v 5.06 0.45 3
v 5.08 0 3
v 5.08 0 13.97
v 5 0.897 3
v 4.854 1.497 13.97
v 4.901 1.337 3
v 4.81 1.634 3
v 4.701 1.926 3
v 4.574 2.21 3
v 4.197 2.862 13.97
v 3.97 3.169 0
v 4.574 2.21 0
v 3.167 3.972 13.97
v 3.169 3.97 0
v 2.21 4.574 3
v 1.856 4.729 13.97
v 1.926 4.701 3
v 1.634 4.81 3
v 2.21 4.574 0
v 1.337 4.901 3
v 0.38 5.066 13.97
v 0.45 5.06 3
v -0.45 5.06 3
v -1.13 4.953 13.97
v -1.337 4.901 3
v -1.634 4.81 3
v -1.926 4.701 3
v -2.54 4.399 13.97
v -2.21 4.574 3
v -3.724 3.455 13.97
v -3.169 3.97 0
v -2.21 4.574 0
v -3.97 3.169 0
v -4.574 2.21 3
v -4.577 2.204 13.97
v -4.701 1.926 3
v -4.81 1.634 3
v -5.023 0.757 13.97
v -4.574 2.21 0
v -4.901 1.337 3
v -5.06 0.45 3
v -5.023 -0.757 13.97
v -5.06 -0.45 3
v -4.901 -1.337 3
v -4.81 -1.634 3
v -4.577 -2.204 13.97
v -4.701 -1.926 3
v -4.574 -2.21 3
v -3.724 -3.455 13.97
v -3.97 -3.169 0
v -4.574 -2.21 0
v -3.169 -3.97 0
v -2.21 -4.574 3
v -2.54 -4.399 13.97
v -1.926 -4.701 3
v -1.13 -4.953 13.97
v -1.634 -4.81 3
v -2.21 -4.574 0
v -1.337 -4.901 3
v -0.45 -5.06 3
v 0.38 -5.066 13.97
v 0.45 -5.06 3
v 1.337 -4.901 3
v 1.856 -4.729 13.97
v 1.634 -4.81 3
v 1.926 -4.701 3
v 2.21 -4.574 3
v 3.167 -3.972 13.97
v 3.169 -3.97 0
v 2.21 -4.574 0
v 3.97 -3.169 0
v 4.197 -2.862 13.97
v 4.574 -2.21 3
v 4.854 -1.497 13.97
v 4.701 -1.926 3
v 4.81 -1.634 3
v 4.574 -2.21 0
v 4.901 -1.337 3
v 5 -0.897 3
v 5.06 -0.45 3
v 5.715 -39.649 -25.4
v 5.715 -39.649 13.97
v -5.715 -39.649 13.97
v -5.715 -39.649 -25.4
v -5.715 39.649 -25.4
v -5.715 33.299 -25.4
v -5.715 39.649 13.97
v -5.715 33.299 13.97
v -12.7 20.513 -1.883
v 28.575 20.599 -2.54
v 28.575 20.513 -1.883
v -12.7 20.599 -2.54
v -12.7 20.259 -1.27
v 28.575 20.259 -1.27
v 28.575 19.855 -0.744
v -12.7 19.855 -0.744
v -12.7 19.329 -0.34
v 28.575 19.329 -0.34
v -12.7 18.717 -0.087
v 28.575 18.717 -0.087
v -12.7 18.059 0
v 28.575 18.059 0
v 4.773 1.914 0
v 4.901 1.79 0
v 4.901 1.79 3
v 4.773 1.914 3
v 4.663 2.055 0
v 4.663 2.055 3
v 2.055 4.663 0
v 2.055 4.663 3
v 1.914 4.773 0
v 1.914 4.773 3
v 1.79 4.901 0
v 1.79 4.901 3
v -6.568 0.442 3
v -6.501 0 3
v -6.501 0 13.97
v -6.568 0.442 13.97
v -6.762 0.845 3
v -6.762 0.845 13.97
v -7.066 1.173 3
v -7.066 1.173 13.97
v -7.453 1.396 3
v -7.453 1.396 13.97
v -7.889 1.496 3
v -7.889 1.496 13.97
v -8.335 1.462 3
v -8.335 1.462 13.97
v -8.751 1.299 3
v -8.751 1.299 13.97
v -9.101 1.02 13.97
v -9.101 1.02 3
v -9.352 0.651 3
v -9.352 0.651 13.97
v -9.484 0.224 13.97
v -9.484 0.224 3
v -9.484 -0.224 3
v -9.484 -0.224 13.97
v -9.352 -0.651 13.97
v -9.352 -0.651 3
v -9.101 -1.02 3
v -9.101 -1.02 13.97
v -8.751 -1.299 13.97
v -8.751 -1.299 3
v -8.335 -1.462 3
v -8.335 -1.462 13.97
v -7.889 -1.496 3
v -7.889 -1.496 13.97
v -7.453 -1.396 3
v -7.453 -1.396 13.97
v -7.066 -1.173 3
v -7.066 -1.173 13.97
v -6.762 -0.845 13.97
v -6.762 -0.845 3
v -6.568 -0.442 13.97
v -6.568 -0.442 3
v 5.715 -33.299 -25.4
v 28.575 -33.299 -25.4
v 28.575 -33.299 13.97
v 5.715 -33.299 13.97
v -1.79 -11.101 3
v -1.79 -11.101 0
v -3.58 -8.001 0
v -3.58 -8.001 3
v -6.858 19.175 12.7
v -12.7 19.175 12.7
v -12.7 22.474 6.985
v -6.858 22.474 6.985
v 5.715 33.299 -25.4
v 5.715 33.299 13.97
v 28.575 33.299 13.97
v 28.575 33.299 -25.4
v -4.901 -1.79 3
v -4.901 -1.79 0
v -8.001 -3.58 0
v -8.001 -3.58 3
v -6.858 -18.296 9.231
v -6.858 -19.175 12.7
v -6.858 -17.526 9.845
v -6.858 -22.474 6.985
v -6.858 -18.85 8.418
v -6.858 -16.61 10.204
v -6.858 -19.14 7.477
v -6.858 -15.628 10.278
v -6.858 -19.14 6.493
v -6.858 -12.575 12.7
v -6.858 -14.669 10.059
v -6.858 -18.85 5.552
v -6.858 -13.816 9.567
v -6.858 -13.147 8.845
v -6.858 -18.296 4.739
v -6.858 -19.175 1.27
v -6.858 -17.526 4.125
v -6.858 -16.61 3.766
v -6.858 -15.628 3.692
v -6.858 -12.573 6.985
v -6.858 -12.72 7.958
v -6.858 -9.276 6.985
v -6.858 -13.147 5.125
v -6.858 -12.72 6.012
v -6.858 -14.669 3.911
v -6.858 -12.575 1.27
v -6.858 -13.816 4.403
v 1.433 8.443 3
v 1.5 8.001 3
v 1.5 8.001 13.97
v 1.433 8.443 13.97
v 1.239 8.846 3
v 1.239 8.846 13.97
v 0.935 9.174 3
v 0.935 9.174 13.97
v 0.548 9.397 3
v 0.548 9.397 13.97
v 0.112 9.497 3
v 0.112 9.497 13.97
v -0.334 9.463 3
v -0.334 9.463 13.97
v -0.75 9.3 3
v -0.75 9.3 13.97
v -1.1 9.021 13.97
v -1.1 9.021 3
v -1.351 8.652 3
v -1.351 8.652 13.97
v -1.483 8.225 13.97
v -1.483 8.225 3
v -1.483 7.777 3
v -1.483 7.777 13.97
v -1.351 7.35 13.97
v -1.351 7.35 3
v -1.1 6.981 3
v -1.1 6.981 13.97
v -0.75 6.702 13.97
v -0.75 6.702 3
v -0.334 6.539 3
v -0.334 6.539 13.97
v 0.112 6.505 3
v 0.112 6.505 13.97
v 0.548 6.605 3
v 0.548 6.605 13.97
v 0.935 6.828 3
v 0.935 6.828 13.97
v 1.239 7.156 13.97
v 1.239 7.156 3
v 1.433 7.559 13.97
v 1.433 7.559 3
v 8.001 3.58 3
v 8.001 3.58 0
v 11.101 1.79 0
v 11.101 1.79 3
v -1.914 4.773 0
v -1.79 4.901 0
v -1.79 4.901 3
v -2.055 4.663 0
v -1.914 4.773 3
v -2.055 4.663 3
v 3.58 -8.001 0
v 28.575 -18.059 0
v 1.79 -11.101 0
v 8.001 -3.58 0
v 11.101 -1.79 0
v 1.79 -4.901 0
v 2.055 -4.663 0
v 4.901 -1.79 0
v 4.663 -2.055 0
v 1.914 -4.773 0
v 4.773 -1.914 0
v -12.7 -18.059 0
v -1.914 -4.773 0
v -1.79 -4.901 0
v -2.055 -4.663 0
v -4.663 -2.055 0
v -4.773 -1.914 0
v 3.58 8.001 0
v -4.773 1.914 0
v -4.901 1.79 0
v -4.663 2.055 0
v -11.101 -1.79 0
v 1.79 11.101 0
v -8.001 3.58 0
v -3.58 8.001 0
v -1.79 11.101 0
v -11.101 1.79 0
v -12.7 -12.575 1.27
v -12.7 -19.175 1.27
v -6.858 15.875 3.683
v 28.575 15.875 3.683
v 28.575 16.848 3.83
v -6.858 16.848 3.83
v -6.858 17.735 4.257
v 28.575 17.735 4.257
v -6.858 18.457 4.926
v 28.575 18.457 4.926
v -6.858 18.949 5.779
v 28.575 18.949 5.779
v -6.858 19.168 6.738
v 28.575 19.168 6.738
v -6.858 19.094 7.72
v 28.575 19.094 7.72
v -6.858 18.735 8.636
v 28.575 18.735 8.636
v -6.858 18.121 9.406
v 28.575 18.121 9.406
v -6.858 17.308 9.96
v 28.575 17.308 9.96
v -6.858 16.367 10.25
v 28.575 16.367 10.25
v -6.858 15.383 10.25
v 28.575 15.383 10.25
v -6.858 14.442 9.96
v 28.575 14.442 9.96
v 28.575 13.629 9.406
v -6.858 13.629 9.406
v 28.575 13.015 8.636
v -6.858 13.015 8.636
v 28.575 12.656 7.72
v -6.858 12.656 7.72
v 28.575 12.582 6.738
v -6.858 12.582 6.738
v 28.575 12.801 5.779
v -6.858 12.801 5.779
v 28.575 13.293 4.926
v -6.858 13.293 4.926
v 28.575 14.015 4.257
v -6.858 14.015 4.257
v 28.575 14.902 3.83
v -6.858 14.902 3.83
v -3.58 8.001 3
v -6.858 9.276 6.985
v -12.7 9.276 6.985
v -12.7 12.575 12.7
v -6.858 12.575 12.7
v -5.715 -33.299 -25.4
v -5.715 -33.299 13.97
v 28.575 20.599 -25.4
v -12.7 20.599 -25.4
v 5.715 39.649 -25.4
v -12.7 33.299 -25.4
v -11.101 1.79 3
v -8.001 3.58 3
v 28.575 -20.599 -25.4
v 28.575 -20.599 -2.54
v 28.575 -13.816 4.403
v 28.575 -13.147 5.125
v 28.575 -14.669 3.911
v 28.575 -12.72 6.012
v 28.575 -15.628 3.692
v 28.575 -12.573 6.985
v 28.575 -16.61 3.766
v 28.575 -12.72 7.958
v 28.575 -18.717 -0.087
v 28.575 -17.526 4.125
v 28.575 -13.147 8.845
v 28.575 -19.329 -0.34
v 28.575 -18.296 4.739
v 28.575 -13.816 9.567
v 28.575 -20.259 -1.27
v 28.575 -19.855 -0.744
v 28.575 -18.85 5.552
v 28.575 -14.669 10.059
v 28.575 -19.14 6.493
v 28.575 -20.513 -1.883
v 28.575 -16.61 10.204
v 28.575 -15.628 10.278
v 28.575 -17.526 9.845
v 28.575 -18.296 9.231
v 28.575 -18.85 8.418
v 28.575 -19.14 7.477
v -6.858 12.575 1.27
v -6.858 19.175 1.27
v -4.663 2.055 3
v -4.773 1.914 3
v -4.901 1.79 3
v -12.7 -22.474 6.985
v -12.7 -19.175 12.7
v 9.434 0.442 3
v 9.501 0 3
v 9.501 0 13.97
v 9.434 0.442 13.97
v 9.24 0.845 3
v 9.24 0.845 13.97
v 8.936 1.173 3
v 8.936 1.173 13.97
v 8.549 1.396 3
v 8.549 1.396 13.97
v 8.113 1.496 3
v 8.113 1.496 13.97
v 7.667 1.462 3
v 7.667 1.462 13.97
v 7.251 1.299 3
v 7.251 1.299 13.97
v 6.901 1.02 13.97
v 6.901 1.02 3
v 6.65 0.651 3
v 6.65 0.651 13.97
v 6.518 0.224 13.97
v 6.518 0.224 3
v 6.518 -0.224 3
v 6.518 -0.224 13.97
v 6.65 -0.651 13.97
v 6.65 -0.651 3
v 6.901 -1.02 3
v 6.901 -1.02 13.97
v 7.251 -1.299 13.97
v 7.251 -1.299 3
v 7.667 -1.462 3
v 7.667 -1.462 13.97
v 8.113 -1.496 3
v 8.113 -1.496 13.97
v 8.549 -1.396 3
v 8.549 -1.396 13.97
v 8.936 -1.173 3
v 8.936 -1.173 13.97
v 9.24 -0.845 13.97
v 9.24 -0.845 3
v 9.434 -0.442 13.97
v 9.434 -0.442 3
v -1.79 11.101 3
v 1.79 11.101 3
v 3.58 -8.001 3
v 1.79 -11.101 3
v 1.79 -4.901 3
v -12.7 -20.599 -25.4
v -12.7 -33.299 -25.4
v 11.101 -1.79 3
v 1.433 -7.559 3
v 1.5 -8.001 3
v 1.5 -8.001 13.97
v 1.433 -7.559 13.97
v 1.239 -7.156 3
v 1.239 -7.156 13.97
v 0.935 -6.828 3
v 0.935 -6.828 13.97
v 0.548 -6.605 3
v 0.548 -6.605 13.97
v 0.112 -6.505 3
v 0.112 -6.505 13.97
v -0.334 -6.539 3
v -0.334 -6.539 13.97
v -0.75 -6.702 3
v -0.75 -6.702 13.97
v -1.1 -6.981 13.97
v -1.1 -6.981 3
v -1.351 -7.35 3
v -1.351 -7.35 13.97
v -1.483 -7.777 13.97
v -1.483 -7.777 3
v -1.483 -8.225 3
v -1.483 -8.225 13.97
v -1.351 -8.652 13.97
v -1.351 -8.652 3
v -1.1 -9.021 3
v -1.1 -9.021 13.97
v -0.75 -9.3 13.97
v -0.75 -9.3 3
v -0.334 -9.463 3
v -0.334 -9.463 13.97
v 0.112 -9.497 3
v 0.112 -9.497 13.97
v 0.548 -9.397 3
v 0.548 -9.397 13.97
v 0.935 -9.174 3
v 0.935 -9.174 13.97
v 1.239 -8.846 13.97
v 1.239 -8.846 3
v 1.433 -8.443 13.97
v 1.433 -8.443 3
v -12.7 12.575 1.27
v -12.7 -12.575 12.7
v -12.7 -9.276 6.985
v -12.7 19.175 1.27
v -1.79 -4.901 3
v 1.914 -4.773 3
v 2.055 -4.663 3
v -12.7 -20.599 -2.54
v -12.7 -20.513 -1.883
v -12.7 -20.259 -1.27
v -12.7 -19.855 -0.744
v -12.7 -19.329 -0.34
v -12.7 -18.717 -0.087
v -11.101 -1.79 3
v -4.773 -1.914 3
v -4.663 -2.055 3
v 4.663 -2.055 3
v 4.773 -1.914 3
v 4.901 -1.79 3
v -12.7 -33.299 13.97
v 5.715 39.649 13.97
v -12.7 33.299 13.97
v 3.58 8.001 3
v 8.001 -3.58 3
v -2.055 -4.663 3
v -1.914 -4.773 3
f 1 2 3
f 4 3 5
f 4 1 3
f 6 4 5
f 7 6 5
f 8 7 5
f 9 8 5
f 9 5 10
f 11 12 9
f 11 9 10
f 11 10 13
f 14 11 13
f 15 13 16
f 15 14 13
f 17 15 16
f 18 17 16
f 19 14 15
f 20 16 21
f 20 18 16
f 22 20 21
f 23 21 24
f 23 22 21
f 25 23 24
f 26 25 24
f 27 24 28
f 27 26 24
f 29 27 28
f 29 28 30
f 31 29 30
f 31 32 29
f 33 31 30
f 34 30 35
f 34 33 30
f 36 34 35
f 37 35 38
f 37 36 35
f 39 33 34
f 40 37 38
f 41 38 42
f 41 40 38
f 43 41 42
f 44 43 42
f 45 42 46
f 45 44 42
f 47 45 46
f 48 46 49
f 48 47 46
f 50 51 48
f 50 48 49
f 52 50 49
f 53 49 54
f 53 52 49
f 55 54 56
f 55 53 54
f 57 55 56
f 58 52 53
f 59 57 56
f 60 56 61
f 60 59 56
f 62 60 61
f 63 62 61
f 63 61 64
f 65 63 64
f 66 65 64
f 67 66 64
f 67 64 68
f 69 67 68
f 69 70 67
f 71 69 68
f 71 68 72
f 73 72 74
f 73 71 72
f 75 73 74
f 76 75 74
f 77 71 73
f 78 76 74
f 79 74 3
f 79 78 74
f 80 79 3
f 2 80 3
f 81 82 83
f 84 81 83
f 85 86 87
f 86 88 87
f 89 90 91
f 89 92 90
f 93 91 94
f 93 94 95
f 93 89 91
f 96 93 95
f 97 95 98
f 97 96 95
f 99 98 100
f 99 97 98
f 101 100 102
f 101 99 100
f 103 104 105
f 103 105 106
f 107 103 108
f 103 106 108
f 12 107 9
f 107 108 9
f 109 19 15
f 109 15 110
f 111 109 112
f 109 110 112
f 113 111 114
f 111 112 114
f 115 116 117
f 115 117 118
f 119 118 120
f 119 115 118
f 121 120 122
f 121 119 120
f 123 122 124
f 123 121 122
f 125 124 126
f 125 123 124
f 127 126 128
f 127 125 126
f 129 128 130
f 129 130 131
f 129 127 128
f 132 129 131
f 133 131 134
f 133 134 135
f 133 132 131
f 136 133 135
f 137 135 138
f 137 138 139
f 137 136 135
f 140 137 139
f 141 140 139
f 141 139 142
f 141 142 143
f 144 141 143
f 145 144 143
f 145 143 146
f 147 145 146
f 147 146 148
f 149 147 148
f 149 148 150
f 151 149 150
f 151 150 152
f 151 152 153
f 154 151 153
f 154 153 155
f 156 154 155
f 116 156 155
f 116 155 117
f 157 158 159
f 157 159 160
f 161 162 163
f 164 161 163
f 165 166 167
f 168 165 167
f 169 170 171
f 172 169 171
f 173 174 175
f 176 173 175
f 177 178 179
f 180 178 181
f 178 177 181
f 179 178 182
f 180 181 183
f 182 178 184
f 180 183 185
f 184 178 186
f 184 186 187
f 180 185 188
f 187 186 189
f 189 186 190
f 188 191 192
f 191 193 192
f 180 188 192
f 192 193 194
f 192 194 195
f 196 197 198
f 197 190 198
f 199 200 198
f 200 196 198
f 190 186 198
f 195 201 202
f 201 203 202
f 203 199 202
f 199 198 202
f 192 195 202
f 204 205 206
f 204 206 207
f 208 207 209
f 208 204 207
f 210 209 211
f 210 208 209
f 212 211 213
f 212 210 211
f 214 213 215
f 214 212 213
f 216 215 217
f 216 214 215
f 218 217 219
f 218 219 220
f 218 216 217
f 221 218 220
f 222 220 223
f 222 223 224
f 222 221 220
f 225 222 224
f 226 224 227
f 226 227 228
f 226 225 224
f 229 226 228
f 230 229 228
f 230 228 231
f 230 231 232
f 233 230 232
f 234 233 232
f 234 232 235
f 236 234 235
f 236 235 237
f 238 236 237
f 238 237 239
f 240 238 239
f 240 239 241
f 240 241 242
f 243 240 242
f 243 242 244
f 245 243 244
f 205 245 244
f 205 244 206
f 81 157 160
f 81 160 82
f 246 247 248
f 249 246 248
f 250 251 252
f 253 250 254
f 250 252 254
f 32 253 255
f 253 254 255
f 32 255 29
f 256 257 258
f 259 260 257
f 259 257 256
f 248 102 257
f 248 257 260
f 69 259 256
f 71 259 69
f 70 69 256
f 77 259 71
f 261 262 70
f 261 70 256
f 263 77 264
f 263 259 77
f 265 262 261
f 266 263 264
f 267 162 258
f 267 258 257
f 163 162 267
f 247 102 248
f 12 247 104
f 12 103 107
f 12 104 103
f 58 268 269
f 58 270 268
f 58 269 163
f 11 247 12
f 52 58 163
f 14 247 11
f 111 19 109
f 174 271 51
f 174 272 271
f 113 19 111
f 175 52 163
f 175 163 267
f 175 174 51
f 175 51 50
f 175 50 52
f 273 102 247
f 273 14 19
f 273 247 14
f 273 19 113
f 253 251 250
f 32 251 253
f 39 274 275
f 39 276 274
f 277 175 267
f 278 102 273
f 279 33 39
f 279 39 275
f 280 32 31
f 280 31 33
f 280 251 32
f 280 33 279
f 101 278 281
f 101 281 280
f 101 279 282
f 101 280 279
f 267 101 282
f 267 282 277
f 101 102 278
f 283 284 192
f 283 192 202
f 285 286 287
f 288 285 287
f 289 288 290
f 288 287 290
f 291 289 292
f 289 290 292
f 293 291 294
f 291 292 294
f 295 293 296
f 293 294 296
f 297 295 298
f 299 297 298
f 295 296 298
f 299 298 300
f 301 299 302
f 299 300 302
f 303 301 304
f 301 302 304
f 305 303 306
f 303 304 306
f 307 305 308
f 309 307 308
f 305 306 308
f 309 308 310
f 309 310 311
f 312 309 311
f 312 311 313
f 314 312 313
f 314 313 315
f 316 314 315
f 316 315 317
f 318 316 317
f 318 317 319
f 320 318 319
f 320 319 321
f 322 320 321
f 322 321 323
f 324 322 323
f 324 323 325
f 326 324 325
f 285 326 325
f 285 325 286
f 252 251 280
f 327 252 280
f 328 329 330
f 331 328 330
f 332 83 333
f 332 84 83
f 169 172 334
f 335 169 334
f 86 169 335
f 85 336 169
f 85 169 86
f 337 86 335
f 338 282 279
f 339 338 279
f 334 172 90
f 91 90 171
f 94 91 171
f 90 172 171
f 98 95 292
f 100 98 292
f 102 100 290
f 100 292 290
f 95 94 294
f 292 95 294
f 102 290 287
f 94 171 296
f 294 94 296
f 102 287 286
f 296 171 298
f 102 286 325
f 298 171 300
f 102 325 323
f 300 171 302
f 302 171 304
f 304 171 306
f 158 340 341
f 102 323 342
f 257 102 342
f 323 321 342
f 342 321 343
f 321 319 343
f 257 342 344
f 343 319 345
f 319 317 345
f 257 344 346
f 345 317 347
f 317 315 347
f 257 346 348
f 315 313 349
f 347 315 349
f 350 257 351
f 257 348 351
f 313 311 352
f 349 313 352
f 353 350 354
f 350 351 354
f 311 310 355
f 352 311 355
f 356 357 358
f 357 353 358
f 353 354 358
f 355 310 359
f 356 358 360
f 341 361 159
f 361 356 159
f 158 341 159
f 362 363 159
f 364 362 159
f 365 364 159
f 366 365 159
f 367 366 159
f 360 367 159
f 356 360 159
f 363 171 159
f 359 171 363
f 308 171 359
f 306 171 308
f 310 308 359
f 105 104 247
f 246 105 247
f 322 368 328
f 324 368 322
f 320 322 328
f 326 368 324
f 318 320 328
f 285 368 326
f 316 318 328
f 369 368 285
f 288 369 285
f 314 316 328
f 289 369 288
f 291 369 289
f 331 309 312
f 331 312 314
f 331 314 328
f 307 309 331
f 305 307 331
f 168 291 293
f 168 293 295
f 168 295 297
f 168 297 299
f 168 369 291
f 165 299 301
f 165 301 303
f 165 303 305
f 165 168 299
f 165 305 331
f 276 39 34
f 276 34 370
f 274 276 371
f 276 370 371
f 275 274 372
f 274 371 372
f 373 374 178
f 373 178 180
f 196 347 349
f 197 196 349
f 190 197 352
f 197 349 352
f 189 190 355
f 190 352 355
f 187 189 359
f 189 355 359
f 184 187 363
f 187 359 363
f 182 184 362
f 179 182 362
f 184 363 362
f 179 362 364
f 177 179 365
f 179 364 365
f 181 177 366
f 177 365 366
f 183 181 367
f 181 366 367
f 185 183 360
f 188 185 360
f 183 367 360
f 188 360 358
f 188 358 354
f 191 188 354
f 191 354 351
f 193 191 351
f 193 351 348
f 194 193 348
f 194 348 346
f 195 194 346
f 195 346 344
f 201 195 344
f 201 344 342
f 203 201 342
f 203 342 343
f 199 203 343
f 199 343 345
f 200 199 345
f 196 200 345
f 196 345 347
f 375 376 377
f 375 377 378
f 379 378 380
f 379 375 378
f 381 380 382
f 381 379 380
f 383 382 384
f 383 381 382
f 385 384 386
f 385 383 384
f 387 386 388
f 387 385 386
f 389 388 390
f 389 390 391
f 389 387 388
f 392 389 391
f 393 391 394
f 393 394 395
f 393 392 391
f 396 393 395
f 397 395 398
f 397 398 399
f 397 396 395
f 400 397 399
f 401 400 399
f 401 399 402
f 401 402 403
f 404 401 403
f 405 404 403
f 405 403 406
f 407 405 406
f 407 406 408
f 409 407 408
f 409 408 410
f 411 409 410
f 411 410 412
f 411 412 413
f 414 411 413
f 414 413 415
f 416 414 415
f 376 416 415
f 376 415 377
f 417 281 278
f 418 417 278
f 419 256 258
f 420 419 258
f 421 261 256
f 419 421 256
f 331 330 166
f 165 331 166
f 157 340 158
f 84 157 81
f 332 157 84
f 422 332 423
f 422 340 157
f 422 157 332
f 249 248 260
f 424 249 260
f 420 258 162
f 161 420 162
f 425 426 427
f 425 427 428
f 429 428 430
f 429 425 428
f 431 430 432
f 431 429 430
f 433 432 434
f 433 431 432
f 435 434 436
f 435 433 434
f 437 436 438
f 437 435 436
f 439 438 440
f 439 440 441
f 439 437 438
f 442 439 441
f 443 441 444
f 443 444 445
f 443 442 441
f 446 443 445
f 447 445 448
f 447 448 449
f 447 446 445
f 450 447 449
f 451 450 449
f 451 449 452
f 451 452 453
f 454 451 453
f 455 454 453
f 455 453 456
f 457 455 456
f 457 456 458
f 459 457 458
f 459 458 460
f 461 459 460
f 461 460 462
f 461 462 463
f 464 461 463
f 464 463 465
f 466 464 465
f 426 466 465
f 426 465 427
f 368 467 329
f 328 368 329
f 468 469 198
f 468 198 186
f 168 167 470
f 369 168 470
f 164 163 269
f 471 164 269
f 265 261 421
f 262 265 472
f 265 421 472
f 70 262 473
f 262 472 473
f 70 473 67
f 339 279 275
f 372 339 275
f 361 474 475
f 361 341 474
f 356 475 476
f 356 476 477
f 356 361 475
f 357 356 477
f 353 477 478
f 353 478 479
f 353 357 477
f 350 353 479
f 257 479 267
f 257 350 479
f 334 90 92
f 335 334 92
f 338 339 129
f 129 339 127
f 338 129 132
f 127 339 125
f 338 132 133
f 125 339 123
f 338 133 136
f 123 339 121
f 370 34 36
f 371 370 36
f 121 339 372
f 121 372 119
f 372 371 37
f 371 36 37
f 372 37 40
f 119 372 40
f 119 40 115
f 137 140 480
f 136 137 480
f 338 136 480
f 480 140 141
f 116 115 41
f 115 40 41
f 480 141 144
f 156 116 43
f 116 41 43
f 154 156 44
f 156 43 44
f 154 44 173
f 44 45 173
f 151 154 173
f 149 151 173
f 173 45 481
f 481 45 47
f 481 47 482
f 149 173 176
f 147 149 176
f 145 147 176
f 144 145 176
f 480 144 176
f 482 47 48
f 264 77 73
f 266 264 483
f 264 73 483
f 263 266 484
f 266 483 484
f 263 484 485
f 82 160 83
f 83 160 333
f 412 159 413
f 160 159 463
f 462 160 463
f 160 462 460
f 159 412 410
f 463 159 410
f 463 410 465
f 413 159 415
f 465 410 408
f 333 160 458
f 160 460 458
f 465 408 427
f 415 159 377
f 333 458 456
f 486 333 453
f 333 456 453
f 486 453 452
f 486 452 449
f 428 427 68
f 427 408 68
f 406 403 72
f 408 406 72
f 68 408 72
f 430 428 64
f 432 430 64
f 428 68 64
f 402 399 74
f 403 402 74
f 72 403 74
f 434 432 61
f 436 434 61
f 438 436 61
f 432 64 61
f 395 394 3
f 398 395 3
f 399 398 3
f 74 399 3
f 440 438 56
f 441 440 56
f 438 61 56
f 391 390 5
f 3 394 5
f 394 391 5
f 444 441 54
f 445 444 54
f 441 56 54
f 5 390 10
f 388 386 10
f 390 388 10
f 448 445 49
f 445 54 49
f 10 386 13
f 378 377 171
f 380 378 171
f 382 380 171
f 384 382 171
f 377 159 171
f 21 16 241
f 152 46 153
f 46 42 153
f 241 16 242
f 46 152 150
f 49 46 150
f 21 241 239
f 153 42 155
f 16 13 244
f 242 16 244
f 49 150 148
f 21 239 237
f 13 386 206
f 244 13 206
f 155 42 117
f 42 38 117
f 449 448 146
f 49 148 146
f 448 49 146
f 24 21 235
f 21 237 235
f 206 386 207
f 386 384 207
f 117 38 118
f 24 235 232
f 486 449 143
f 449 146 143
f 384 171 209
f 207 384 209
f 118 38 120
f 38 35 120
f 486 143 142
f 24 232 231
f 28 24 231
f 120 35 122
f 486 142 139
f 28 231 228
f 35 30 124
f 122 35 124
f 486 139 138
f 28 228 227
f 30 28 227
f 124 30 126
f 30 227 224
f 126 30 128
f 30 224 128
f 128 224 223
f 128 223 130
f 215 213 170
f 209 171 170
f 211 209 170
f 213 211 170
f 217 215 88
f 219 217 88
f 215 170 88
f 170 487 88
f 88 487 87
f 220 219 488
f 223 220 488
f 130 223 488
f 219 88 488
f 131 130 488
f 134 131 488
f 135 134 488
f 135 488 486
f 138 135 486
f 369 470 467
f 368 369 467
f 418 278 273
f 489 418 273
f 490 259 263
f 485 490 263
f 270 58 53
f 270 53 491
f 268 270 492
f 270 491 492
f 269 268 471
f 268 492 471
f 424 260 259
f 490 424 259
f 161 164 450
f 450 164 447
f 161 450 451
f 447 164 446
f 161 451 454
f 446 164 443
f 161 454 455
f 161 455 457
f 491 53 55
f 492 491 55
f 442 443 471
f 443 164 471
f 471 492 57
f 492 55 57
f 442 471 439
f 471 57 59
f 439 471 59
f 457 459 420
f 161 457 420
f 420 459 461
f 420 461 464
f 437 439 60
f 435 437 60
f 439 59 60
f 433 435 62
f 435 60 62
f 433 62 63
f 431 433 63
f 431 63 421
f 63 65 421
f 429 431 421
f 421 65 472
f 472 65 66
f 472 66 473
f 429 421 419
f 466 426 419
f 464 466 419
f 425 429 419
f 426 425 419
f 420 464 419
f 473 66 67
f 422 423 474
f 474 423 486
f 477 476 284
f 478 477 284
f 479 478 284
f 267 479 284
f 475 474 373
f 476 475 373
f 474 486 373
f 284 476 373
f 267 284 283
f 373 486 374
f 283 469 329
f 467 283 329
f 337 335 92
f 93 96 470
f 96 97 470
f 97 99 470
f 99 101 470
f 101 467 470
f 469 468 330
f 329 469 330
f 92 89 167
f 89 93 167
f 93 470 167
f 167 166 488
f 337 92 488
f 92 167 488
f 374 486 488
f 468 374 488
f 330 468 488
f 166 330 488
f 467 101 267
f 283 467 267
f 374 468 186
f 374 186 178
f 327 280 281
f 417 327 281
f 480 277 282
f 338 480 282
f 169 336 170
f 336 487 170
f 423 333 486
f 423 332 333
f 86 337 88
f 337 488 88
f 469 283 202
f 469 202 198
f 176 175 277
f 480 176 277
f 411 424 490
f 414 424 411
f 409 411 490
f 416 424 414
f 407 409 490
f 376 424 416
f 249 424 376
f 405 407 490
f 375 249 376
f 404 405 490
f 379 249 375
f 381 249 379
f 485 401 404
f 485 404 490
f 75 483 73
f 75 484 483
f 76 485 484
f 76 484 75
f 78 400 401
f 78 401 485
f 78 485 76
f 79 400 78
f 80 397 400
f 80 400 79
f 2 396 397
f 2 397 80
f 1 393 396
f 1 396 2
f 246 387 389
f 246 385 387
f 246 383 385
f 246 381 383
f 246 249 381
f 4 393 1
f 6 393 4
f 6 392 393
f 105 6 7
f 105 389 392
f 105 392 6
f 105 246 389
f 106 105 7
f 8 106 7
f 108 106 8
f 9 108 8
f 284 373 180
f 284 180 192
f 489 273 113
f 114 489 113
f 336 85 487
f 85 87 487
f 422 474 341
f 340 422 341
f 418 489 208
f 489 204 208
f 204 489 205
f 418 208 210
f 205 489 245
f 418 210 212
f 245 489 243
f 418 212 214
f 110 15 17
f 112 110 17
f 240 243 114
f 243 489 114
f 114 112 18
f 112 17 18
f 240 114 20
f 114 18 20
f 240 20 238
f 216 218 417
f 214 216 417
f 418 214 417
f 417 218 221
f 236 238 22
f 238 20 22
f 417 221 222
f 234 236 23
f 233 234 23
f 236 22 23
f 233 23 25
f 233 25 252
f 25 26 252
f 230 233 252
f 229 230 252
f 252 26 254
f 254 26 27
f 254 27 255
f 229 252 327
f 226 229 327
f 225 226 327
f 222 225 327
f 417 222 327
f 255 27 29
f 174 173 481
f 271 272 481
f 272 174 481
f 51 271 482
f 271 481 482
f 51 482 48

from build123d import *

# Parameters (mm, degrees)
SKETCH1_R           = 1.499997
SKETCH1_R_2         = 5.08
BOSS_EXTRUDE1_DEPTH = 13.97
CUT_EXTRUDE1_DEPTH  = 3
FILLET1_R           = 1.27
SKETCH3_R           = 3.302
CUT_EXTRUDE2_DEPTH  = 41.275
CUT_EXTRUDE3_DEPTH  = 5.842
BOSS_EXTRUDE2_DEPTH = 25.4
FILLET2_R           = 2.54


with BuildPart() as part:
    # Sketch1 → Boss-Extrude1 (new body)
    with BuildSketch(Plane.XY):
        Polygon((-12.7, 33.2994), (-5.715, 33.2994), (-5.715, 39.6494), (5.715, 39.6494), (5.715, 33.2994), (28.575, 33.2994), (28.575, -33.2994), (5.715, -33.2994), (5.715, -39.6494), (-5.715, -39.6494), (-5.715, -33.2994), (-12.7, -33.2994), align=None)
        with Locations((0, 8.001)):
            Circle(SKETCH1_R, mode=Mode.SUBTRACT)
        with Locations((8.001, 0)):
            Circle(SKETCH1_R, mode=Mode.SUBTRACT)
        Circle(SKETCH1_R_2, mode=Mode.SUBTRACT)
        with Locations((0, -8.001)):
            Circle(SKETCH1_R, mode=Mode.SUBTRACT)
        with Locations((-8.001, 0)):
            Circle(SKETCH1_R, mode=Mode.SUBTRACT)
    extrude(amount=BOSS_EXTRUDE1_DEPTH)

    # Sketch2 → Cut-Extrude1 (cut)
    with BuildSketch(Plane(origin=(0, 0, 0), x_dir=(-1, 0, 0), z_dir=(0, 0, -1))):
        Polygon((8.001, -3.579571669), (11.101, -1.789785834), (11.101, 1.789785834), (8.001, 3.579571669), (4.901, 1.789785834), (4.901, -1.789785834), align=None)
        Polygon((3.579571669, 8.001), (1.789785834, 11.101), (-1.789785834, 11.101), (-3.579571669, 8.001), (-1.789785834, 4.901), (1.789785834, 4.901), align=None)
        Polygon((-3.579571669, -8.001), (-1.789785834, -11.101), (1.789785834, -11.101), (3.579571669, -8.001), (1.789785834, -4.901), (-1.789785834, -4.901), align=None)
        Polygon((-8.001, 3.579571669), (-11.101, 1.789785834), (-11.101, -1.789785834), (-8.001, -3.579571669), (-4.901, -1.789785834), (-4.901, 1.789785834), align=None)
    extrude(amount=-CUT_EXTRUDE1_DEPTH, mode=Mode.SUBTRACT)

    # Fillet1
    # the kernel refuses this fillet: 1.27 mm, written as the material it takes off along each edge
    with BuildSketch(Plane(origin=(-4.901, -1.336637198, 3), x_dir=(0.3505491054701989, -0.9365443527425935, 0), z_dir=(0, 0, -1)), Plane(origin=(-1.336637198, 4.901, 3), x_dir=(-0.9365443527425947, -0.3505491054701953, 0), z_dir=(0, 0, -1)), Plane(origin=(1.336637198, -4.901, 3), x_dir=(0.9365443527425922, 0.3505491054702024, 0), z_dir=(0, 0, -1))) as fillet1_piece_1:
        with BuildLine():
            CenterArc((1.048997579, 1.264640212), FILLET1_R, 240.540119445, 24.194103812)
            Line((0.424393796, 0.158850849), (0, 0))
            ThreePointArc((0, 0), (0.466221146, 0.021439153), (0.932442292, 0))
        make_face()
    extrude(amount=5.331105731, mode=Mode.SUBTRACT)
    with BuildSketch(Plane(origin=(-4.901, 1.336637198, 3), x_dir=(0.35054910547019297, 0.9365443527425957, 0), z_dir=(0, 0, -1)), Plane(origin=(1.336637198, 4.901, 3), x_dir=(0.9365443527425946, -0.3505491054701959, 0), z_dir=(0, 0, -1)), Plane(origin=(-1.336637198, -4.901, 3), x_dir=(-0.9365443527425968, 0.35054910547018975, 0), z_dir=(0, 0, -1))) as fillet1_piece_2:
        with BuildLine():
            CenterArc((1.048997579, -1.264640212), FILLET1_R, 95.265776743, 24.194103812)
            Line((0.424393796, -0.158850849), (0, 0))
            ThreePointArc((0, 0), (0.466221146, -0.021439153), (0.932442292, 0))
        make_face()
    extrude(amount=5.331105731, mode=Mode.SUBTRACT)
    with BuildSketch(Plane(origin=(4.901, 1.336637198, 3), x_dir=(0, 1, 0), z_dir=(0, 0, -1))) as fillet1_piece_3:
        with BuildLine():
            CenterArc((1.425751253, 0.816666486), FILLET1_R, 220.019214916, 24.194103812)
            ThreePointArc((0.873273563, -0.326866811), (0.444152257, -0.143354688), (0, 0))
            Line((0, 0), (0.453148636, 0))
        make_face()
    extrude(amount=5.331105731, mode=Mode.SUBTRACT)
    with BuildSketch(Plane(origin=(4.901, -1.336637198, 3), x_dir=(0, -1, 0), z_dir=(0, 0, -1))) as fillet1_piece_4:
        with BuildLine():
            CenterArc((1.425751253, -0.816666486), FILLET1_R, 115.786681272, 24.194103812)
            ThreePointArc((0.873273563, 0.326866811), (0.444152257, 0.143354688), (0, 0))
            Line((0, 0), (0.453148636, 0))
        make_face()
    extrude(amount=5.331105731, mode=Mode.SUBTRACT)

    # Sketch3 → Cut-Extrude2 (cut)
    with BuildSketch(Plane(origin=(28.575, 0, 0), x_dir=(0, 0, -1), z_dir=(1, 0, 0))):
        with Locations((-6.985, 15.875)):
            Circle(SKETCH3_R)
        with Locations(Location((-6.985, -15.875, 0), (0, 0, 90))):
            Circle(SKETCH3_R)
    extrude(amount=-CUT_EXTRUDE2_DEPTH, mode=Mode.SUBTRACT)

    # Sketch4 → Cut-Extrude3 (cut)
    with BuildSketch(Plane.ZY.offset(12.7)):
        Polygon((12.7, -19.174556788), (6.985, -22.474113577), (1.27, -19.174556788), (1.27, -12.575443212), (6.985, -9.275886423), (12.7, -12.575443212), align=None)
        Polygon((6.985, 22.474113577), (1.27, 19.174556788), (1.27, 12.575443212), (6.985, 9.275886423), (12.7, 12.575443212), (12.7, 19.174556788), align=None)
    extrude(amount=-CUT_EXTRUDE3_DEPTH, mode=Mode.SUBTRACT)

    # Sketch5 → Boss-Extrude2 (add)
    with BuildSketch(Plane(origin=(0, 0, 0), x_dir=(-1, 0, 0), z_dir=(0, 0, -1))):
        Polygon((-28.575, 20.5994), (12.7, 20.5994), (12.7, 33.2994), (5.715, 33.2994), (5.715, 39.6494), (-5.715, 39.6494), (-5.715, 33.2994), (-28.575, 33.2994), align=None)
        Polygon((12.7, -20.5994), (-28.575, -20.5994), (-28.575, -33.2994), (-5.715, -33.2994), (-5.715, -39.6494), (5.715, -39.6494), (5.715, -33.2994), (12.7, -33.2994), align=None)
    extrude(amount=BOSS_EXTRUDE2_DEPTH)

    # Fillet2
    fillet2_edges = [part.edges().sort_by_distance(p)[0] for p in [
        (7.9375, -20.5994, 0),
        (7.9375, 20.5994, 0),
    ]]
    fillet(fillet2_edges, radius=FILLET2_R)


solid = part.part
